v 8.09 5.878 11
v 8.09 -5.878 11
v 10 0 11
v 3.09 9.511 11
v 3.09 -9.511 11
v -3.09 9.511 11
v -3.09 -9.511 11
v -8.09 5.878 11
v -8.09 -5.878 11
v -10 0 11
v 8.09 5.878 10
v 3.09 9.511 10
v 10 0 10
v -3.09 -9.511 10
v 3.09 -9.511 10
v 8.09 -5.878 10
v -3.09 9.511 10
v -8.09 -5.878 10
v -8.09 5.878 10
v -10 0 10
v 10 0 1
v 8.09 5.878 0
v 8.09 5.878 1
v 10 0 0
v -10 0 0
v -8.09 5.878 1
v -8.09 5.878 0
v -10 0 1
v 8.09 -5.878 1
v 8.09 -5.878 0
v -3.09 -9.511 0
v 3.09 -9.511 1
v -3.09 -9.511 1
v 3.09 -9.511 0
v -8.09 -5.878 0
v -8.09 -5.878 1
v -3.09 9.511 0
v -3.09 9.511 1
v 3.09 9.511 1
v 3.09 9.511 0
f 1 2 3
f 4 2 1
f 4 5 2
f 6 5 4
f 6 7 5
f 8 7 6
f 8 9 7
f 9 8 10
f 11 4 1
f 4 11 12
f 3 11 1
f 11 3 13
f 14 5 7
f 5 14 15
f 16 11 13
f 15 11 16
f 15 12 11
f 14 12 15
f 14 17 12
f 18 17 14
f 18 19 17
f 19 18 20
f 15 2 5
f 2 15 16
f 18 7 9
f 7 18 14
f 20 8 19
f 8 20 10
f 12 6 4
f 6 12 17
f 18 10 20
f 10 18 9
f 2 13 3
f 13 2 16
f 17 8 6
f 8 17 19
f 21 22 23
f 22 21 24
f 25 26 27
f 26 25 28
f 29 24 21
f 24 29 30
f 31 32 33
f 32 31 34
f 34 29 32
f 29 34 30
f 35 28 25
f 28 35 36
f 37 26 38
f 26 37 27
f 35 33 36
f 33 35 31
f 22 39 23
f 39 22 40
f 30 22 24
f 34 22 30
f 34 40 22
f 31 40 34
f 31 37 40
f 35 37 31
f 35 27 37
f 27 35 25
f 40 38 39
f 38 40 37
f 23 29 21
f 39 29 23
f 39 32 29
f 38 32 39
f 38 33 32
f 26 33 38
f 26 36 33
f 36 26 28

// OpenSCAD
/**
 * Calculate the number of facets to generate for radius `r`. This is intended
 * to mimic OpenSCAD's internal get_fragments_from_r() function.
 *
 * @param r Radius of circle
 */
function get_fragments_from_r(r) =
    (($fn > 0) ? $fn
               : (r < 0.00000095367431640625)
                     ? 3
                     : ceil(max(min(360 / $fa, r * 2 * PI / $fs), 5)));

/**
 * This is a function that generates a series of values ala $t for use as facet
 * IDs.
 *
 * @param r Radius of circle
 */
function gen_facet_series(r) = [0:1.0 / get_fragments_from_r(r):1.0001];

// example
translate([ 0, 0, 10 ]) linear_extrude(1) circle(10, $fn = 10);

linear_extrude(1) polygon([let(r = 10) for (t = gen_facet_series(r, $fn = 10))
        let(angle = t * 360)[cos(angle) * r, sin(angle) * r]]);
